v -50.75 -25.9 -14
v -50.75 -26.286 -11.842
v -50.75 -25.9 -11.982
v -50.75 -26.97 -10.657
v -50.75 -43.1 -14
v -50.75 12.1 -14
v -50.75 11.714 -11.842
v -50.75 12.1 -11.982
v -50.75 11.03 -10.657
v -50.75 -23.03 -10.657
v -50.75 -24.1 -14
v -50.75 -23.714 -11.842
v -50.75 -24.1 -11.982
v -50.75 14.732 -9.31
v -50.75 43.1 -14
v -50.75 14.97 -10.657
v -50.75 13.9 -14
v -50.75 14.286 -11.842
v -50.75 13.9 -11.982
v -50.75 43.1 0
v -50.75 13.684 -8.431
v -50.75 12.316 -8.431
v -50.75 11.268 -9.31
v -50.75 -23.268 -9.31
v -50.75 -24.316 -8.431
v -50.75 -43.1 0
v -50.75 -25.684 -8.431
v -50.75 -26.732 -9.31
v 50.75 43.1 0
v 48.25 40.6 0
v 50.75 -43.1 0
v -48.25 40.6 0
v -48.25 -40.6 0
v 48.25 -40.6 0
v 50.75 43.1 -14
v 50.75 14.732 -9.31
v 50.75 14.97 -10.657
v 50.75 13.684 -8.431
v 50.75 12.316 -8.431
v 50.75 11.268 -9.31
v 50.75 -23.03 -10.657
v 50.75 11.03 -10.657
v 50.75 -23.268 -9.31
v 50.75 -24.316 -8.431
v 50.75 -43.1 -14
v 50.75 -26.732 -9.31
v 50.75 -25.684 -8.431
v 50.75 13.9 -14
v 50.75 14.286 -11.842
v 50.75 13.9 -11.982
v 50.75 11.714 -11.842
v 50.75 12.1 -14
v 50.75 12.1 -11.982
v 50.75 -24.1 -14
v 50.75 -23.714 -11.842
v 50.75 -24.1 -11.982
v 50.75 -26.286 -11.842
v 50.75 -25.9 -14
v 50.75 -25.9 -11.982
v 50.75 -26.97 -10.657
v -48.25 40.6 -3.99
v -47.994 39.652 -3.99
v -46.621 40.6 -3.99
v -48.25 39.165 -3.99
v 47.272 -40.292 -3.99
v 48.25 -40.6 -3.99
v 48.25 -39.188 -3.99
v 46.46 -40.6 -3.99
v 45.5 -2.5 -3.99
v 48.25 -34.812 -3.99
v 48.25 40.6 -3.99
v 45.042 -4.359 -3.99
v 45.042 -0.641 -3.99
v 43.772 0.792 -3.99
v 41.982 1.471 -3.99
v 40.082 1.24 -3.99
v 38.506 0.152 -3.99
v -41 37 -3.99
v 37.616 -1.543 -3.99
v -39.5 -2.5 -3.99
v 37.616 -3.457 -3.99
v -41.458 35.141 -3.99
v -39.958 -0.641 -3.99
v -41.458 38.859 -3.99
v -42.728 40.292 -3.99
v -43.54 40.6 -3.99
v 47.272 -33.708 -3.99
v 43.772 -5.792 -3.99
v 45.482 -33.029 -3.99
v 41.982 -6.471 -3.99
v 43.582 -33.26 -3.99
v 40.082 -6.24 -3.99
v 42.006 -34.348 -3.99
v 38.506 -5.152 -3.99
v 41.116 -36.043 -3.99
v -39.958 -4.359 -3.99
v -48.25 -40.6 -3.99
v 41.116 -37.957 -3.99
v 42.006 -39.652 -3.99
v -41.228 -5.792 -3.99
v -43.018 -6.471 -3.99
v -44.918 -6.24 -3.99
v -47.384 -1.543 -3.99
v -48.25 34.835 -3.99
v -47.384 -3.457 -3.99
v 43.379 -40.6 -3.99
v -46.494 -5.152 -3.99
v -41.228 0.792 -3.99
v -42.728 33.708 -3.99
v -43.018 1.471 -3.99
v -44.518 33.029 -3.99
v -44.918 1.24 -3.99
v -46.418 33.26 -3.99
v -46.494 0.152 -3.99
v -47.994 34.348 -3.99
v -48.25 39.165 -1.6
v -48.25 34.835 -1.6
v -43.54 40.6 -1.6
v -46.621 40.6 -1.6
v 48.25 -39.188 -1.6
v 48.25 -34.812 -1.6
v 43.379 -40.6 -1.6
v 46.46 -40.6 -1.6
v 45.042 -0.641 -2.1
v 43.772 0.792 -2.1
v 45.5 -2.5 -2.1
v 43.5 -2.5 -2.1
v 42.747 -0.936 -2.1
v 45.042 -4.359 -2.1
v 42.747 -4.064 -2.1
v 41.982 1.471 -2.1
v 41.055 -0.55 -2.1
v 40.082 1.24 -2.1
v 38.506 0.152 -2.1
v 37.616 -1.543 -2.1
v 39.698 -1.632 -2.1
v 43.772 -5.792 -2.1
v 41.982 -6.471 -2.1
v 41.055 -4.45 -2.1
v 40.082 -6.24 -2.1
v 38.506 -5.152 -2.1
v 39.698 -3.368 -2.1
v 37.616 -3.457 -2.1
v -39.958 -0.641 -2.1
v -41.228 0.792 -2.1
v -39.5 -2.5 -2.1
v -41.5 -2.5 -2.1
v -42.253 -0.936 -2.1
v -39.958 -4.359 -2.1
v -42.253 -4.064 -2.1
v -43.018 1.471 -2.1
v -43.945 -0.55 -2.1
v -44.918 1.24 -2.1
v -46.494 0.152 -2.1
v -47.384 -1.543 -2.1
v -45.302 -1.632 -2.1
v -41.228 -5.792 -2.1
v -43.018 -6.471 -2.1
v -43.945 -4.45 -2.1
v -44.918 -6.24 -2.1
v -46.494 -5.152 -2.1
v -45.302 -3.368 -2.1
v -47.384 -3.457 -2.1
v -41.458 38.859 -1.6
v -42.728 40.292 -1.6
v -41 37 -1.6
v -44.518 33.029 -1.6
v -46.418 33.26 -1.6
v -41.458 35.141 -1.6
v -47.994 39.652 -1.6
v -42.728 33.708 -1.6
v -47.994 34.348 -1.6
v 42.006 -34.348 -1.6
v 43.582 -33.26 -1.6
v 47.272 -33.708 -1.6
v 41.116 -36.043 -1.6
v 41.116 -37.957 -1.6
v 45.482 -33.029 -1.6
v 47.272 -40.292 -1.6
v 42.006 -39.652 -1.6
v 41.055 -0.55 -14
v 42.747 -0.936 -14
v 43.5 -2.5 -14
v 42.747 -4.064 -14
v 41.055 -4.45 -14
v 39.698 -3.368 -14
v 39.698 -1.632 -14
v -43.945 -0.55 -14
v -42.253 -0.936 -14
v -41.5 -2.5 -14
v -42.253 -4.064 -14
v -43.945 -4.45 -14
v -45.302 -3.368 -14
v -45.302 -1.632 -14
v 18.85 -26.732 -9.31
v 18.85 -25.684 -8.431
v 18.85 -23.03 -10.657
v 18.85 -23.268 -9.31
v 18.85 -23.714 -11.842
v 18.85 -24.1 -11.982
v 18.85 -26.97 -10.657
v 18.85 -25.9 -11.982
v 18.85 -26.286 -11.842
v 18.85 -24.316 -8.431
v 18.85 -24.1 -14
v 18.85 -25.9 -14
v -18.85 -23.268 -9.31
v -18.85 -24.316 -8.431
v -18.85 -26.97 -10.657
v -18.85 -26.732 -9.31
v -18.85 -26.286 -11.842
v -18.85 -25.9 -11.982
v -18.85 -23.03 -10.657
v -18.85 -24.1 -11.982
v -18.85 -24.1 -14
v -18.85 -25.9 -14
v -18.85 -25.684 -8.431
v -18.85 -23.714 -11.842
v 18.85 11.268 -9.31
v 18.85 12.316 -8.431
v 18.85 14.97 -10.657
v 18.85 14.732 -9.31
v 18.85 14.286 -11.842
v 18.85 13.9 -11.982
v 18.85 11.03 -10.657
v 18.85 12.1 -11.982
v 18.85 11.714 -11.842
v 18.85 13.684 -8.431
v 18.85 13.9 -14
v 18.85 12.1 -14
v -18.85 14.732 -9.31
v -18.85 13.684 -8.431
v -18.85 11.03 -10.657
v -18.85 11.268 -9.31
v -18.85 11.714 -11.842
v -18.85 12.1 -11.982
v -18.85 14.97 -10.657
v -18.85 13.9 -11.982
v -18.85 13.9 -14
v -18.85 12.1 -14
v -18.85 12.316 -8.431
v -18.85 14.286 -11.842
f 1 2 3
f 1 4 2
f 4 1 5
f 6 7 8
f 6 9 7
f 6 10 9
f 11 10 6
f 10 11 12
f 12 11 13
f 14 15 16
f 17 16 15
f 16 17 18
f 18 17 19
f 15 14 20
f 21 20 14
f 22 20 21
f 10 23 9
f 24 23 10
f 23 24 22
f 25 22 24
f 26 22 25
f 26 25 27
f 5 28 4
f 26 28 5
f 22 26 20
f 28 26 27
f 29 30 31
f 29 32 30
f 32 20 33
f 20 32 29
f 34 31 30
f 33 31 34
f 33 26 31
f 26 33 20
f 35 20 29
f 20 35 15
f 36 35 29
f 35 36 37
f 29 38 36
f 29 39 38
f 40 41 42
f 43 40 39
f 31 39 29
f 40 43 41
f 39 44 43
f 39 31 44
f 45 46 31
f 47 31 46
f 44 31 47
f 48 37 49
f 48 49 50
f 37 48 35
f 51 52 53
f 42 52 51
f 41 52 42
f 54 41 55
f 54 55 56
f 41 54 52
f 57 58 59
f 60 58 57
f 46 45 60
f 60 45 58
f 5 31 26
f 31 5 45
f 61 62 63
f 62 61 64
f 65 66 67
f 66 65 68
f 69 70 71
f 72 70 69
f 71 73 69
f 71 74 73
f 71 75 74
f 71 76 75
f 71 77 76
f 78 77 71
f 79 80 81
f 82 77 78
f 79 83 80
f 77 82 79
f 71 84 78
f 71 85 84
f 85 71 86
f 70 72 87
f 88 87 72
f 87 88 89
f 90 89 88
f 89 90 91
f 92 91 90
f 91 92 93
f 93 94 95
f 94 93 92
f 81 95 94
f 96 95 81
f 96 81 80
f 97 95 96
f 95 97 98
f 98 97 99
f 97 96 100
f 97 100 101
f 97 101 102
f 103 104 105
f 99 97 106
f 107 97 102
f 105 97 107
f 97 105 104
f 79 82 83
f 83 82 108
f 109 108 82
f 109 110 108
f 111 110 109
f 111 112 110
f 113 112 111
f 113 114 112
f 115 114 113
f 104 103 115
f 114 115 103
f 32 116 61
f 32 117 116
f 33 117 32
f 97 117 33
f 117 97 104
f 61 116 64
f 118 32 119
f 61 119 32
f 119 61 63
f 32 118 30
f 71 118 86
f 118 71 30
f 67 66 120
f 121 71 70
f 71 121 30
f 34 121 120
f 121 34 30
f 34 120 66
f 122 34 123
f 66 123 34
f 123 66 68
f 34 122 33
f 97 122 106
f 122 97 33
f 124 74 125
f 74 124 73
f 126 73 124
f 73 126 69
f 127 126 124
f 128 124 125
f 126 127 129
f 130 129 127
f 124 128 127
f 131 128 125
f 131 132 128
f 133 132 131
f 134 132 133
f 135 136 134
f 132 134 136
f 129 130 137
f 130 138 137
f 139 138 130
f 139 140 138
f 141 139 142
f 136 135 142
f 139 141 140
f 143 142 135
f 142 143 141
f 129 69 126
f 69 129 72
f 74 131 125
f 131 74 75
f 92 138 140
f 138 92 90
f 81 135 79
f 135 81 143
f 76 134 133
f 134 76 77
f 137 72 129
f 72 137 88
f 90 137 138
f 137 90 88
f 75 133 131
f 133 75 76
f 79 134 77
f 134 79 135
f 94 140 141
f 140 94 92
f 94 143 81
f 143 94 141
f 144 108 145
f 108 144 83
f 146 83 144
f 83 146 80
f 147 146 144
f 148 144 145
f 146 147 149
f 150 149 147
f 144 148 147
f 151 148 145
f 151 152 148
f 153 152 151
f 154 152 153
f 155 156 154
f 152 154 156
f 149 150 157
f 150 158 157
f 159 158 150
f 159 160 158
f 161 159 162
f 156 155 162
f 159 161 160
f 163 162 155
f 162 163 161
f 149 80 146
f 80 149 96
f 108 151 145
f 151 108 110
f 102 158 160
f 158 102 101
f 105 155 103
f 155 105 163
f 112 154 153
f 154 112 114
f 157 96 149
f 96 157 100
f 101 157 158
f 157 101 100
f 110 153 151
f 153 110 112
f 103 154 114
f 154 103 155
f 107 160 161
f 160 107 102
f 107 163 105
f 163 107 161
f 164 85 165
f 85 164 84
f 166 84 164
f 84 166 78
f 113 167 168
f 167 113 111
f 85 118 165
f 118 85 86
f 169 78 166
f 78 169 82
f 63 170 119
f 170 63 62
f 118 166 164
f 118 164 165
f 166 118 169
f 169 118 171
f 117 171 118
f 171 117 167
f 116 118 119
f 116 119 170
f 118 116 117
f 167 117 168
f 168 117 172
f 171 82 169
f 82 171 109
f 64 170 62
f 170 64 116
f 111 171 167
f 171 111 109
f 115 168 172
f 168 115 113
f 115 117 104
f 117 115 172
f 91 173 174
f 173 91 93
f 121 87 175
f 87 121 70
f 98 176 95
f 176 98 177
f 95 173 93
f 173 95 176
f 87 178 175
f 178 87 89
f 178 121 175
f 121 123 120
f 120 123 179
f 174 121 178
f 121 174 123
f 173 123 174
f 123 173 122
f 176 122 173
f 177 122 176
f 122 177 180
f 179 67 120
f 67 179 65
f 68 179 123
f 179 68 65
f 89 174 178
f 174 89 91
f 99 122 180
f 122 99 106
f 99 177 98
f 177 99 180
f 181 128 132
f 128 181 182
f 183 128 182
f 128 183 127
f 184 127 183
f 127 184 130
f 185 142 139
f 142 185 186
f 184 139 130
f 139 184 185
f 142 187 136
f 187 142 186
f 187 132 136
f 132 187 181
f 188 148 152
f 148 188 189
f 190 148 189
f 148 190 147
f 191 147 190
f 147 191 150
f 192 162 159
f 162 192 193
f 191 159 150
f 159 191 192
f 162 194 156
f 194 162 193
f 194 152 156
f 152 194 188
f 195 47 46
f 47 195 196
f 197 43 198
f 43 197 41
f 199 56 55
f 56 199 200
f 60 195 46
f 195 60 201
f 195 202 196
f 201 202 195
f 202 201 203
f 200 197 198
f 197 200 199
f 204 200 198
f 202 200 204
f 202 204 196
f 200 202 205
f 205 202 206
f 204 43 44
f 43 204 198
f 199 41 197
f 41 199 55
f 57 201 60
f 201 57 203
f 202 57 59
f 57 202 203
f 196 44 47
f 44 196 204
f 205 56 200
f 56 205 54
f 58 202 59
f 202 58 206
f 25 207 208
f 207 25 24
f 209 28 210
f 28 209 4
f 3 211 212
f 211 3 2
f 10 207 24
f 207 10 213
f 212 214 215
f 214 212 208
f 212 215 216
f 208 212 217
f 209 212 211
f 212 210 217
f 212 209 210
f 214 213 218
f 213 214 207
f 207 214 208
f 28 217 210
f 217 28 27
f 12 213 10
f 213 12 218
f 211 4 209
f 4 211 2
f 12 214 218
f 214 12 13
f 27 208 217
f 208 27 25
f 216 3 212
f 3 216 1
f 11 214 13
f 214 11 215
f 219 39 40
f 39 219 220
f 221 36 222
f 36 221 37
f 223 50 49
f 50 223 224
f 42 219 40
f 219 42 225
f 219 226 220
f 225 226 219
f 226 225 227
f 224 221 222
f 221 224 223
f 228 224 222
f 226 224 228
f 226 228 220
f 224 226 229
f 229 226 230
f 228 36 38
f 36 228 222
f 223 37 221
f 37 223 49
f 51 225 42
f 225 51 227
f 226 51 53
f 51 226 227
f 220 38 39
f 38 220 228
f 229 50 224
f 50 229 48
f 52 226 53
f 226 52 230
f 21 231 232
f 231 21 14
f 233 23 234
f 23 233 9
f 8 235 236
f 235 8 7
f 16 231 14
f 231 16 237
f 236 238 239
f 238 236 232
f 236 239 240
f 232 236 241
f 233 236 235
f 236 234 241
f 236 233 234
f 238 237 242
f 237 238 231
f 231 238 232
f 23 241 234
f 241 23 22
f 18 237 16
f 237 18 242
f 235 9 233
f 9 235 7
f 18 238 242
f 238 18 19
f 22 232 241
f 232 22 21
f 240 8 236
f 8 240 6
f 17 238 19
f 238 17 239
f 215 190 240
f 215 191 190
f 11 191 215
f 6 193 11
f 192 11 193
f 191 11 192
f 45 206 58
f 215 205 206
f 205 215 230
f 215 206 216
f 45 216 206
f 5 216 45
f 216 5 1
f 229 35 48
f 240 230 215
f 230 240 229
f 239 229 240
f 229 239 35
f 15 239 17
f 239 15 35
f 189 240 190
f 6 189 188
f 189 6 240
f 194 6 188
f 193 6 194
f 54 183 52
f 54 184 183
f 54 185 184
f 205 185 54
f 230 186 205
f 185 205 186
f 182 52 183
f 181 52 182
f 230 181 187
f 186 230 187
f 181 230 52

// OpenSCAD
board_size = [96.5, 81.2];
mount_size = board_size + [5, 5];
height = 8;
tray_depth = 4;
pcb_thickness = 1.6;

screw_positions = [
  [(85 / 2) - 1.0, -2.5],
  [(-85 / 2) - 1.0, -2.5],
];

board_supports = [
  [-45, 37],
  [45, -37],
];

module Main() {
  difference() {
    union() {
      difference() {
        translate([0, 0, -height]) {
          linear_extrude(height) {
            square(mount_size, center = true);
          }
        }

        translate([0, 0, 0.01 - tray_depth]) {
          linear_extrude(tray_depth) {
            square(board_size, center = true);
          }
        }
      }

      translate([0, 0, -tray_depth]) {
        for(p = screw_positions) {
          translate(p) {
            cylinder(d = 8, h = abs(tray_depth) - pcb_thickness - 0.5);
          }
        }
        for(p = board_supports) {
          translate(p) {
            cylinder(d = 8, h = abs(tray_depth) - pcb_thickness);
          }
        }
      }
    }

    translate([0, 0, -height - 1]) {
      for(p = screw_positions) {
        translate(p) {
          cylinder(d = 4, h = height + 2);
        }
      }
    }
  }
}

module DinBracketMount() {
  h2 = 6;
  depth = 32;
  fw = 1.8;
  ho = 3.7;

  difference() {
    translate([0, 0, -height - h2]) {
      linear_extrude(h2) {
        square(mount_size, center = true);
      }
    }

    translate([0, 0, -height - h2 - 0.01]) {
      for(p = screw_positions) {
        translate(p) {
          cylinder(d = 4, h = h2 + 0.1);
        }
      }

      for(y = [-25, -25 + 38]) {
        translate([0, y, ho]) {
          for(a = [0, 180]) {
            rotate([0, 0, a]) {
              translate([(mount_size[0] / 2) - depth + 0.1, 0, 0]) {
                rotate([0, 90, 0])
                cylinder(d = 4, h = depth, $fn = 9);
              }
              translate([(mount_size[0] / 2) - depth + 0.1, -fw / 2, -ho]) {
                cube([depth, fw, ho]);
              }
            }
          }
        } 
      }
    }
  }
}

Main();
DinBracketMount();
